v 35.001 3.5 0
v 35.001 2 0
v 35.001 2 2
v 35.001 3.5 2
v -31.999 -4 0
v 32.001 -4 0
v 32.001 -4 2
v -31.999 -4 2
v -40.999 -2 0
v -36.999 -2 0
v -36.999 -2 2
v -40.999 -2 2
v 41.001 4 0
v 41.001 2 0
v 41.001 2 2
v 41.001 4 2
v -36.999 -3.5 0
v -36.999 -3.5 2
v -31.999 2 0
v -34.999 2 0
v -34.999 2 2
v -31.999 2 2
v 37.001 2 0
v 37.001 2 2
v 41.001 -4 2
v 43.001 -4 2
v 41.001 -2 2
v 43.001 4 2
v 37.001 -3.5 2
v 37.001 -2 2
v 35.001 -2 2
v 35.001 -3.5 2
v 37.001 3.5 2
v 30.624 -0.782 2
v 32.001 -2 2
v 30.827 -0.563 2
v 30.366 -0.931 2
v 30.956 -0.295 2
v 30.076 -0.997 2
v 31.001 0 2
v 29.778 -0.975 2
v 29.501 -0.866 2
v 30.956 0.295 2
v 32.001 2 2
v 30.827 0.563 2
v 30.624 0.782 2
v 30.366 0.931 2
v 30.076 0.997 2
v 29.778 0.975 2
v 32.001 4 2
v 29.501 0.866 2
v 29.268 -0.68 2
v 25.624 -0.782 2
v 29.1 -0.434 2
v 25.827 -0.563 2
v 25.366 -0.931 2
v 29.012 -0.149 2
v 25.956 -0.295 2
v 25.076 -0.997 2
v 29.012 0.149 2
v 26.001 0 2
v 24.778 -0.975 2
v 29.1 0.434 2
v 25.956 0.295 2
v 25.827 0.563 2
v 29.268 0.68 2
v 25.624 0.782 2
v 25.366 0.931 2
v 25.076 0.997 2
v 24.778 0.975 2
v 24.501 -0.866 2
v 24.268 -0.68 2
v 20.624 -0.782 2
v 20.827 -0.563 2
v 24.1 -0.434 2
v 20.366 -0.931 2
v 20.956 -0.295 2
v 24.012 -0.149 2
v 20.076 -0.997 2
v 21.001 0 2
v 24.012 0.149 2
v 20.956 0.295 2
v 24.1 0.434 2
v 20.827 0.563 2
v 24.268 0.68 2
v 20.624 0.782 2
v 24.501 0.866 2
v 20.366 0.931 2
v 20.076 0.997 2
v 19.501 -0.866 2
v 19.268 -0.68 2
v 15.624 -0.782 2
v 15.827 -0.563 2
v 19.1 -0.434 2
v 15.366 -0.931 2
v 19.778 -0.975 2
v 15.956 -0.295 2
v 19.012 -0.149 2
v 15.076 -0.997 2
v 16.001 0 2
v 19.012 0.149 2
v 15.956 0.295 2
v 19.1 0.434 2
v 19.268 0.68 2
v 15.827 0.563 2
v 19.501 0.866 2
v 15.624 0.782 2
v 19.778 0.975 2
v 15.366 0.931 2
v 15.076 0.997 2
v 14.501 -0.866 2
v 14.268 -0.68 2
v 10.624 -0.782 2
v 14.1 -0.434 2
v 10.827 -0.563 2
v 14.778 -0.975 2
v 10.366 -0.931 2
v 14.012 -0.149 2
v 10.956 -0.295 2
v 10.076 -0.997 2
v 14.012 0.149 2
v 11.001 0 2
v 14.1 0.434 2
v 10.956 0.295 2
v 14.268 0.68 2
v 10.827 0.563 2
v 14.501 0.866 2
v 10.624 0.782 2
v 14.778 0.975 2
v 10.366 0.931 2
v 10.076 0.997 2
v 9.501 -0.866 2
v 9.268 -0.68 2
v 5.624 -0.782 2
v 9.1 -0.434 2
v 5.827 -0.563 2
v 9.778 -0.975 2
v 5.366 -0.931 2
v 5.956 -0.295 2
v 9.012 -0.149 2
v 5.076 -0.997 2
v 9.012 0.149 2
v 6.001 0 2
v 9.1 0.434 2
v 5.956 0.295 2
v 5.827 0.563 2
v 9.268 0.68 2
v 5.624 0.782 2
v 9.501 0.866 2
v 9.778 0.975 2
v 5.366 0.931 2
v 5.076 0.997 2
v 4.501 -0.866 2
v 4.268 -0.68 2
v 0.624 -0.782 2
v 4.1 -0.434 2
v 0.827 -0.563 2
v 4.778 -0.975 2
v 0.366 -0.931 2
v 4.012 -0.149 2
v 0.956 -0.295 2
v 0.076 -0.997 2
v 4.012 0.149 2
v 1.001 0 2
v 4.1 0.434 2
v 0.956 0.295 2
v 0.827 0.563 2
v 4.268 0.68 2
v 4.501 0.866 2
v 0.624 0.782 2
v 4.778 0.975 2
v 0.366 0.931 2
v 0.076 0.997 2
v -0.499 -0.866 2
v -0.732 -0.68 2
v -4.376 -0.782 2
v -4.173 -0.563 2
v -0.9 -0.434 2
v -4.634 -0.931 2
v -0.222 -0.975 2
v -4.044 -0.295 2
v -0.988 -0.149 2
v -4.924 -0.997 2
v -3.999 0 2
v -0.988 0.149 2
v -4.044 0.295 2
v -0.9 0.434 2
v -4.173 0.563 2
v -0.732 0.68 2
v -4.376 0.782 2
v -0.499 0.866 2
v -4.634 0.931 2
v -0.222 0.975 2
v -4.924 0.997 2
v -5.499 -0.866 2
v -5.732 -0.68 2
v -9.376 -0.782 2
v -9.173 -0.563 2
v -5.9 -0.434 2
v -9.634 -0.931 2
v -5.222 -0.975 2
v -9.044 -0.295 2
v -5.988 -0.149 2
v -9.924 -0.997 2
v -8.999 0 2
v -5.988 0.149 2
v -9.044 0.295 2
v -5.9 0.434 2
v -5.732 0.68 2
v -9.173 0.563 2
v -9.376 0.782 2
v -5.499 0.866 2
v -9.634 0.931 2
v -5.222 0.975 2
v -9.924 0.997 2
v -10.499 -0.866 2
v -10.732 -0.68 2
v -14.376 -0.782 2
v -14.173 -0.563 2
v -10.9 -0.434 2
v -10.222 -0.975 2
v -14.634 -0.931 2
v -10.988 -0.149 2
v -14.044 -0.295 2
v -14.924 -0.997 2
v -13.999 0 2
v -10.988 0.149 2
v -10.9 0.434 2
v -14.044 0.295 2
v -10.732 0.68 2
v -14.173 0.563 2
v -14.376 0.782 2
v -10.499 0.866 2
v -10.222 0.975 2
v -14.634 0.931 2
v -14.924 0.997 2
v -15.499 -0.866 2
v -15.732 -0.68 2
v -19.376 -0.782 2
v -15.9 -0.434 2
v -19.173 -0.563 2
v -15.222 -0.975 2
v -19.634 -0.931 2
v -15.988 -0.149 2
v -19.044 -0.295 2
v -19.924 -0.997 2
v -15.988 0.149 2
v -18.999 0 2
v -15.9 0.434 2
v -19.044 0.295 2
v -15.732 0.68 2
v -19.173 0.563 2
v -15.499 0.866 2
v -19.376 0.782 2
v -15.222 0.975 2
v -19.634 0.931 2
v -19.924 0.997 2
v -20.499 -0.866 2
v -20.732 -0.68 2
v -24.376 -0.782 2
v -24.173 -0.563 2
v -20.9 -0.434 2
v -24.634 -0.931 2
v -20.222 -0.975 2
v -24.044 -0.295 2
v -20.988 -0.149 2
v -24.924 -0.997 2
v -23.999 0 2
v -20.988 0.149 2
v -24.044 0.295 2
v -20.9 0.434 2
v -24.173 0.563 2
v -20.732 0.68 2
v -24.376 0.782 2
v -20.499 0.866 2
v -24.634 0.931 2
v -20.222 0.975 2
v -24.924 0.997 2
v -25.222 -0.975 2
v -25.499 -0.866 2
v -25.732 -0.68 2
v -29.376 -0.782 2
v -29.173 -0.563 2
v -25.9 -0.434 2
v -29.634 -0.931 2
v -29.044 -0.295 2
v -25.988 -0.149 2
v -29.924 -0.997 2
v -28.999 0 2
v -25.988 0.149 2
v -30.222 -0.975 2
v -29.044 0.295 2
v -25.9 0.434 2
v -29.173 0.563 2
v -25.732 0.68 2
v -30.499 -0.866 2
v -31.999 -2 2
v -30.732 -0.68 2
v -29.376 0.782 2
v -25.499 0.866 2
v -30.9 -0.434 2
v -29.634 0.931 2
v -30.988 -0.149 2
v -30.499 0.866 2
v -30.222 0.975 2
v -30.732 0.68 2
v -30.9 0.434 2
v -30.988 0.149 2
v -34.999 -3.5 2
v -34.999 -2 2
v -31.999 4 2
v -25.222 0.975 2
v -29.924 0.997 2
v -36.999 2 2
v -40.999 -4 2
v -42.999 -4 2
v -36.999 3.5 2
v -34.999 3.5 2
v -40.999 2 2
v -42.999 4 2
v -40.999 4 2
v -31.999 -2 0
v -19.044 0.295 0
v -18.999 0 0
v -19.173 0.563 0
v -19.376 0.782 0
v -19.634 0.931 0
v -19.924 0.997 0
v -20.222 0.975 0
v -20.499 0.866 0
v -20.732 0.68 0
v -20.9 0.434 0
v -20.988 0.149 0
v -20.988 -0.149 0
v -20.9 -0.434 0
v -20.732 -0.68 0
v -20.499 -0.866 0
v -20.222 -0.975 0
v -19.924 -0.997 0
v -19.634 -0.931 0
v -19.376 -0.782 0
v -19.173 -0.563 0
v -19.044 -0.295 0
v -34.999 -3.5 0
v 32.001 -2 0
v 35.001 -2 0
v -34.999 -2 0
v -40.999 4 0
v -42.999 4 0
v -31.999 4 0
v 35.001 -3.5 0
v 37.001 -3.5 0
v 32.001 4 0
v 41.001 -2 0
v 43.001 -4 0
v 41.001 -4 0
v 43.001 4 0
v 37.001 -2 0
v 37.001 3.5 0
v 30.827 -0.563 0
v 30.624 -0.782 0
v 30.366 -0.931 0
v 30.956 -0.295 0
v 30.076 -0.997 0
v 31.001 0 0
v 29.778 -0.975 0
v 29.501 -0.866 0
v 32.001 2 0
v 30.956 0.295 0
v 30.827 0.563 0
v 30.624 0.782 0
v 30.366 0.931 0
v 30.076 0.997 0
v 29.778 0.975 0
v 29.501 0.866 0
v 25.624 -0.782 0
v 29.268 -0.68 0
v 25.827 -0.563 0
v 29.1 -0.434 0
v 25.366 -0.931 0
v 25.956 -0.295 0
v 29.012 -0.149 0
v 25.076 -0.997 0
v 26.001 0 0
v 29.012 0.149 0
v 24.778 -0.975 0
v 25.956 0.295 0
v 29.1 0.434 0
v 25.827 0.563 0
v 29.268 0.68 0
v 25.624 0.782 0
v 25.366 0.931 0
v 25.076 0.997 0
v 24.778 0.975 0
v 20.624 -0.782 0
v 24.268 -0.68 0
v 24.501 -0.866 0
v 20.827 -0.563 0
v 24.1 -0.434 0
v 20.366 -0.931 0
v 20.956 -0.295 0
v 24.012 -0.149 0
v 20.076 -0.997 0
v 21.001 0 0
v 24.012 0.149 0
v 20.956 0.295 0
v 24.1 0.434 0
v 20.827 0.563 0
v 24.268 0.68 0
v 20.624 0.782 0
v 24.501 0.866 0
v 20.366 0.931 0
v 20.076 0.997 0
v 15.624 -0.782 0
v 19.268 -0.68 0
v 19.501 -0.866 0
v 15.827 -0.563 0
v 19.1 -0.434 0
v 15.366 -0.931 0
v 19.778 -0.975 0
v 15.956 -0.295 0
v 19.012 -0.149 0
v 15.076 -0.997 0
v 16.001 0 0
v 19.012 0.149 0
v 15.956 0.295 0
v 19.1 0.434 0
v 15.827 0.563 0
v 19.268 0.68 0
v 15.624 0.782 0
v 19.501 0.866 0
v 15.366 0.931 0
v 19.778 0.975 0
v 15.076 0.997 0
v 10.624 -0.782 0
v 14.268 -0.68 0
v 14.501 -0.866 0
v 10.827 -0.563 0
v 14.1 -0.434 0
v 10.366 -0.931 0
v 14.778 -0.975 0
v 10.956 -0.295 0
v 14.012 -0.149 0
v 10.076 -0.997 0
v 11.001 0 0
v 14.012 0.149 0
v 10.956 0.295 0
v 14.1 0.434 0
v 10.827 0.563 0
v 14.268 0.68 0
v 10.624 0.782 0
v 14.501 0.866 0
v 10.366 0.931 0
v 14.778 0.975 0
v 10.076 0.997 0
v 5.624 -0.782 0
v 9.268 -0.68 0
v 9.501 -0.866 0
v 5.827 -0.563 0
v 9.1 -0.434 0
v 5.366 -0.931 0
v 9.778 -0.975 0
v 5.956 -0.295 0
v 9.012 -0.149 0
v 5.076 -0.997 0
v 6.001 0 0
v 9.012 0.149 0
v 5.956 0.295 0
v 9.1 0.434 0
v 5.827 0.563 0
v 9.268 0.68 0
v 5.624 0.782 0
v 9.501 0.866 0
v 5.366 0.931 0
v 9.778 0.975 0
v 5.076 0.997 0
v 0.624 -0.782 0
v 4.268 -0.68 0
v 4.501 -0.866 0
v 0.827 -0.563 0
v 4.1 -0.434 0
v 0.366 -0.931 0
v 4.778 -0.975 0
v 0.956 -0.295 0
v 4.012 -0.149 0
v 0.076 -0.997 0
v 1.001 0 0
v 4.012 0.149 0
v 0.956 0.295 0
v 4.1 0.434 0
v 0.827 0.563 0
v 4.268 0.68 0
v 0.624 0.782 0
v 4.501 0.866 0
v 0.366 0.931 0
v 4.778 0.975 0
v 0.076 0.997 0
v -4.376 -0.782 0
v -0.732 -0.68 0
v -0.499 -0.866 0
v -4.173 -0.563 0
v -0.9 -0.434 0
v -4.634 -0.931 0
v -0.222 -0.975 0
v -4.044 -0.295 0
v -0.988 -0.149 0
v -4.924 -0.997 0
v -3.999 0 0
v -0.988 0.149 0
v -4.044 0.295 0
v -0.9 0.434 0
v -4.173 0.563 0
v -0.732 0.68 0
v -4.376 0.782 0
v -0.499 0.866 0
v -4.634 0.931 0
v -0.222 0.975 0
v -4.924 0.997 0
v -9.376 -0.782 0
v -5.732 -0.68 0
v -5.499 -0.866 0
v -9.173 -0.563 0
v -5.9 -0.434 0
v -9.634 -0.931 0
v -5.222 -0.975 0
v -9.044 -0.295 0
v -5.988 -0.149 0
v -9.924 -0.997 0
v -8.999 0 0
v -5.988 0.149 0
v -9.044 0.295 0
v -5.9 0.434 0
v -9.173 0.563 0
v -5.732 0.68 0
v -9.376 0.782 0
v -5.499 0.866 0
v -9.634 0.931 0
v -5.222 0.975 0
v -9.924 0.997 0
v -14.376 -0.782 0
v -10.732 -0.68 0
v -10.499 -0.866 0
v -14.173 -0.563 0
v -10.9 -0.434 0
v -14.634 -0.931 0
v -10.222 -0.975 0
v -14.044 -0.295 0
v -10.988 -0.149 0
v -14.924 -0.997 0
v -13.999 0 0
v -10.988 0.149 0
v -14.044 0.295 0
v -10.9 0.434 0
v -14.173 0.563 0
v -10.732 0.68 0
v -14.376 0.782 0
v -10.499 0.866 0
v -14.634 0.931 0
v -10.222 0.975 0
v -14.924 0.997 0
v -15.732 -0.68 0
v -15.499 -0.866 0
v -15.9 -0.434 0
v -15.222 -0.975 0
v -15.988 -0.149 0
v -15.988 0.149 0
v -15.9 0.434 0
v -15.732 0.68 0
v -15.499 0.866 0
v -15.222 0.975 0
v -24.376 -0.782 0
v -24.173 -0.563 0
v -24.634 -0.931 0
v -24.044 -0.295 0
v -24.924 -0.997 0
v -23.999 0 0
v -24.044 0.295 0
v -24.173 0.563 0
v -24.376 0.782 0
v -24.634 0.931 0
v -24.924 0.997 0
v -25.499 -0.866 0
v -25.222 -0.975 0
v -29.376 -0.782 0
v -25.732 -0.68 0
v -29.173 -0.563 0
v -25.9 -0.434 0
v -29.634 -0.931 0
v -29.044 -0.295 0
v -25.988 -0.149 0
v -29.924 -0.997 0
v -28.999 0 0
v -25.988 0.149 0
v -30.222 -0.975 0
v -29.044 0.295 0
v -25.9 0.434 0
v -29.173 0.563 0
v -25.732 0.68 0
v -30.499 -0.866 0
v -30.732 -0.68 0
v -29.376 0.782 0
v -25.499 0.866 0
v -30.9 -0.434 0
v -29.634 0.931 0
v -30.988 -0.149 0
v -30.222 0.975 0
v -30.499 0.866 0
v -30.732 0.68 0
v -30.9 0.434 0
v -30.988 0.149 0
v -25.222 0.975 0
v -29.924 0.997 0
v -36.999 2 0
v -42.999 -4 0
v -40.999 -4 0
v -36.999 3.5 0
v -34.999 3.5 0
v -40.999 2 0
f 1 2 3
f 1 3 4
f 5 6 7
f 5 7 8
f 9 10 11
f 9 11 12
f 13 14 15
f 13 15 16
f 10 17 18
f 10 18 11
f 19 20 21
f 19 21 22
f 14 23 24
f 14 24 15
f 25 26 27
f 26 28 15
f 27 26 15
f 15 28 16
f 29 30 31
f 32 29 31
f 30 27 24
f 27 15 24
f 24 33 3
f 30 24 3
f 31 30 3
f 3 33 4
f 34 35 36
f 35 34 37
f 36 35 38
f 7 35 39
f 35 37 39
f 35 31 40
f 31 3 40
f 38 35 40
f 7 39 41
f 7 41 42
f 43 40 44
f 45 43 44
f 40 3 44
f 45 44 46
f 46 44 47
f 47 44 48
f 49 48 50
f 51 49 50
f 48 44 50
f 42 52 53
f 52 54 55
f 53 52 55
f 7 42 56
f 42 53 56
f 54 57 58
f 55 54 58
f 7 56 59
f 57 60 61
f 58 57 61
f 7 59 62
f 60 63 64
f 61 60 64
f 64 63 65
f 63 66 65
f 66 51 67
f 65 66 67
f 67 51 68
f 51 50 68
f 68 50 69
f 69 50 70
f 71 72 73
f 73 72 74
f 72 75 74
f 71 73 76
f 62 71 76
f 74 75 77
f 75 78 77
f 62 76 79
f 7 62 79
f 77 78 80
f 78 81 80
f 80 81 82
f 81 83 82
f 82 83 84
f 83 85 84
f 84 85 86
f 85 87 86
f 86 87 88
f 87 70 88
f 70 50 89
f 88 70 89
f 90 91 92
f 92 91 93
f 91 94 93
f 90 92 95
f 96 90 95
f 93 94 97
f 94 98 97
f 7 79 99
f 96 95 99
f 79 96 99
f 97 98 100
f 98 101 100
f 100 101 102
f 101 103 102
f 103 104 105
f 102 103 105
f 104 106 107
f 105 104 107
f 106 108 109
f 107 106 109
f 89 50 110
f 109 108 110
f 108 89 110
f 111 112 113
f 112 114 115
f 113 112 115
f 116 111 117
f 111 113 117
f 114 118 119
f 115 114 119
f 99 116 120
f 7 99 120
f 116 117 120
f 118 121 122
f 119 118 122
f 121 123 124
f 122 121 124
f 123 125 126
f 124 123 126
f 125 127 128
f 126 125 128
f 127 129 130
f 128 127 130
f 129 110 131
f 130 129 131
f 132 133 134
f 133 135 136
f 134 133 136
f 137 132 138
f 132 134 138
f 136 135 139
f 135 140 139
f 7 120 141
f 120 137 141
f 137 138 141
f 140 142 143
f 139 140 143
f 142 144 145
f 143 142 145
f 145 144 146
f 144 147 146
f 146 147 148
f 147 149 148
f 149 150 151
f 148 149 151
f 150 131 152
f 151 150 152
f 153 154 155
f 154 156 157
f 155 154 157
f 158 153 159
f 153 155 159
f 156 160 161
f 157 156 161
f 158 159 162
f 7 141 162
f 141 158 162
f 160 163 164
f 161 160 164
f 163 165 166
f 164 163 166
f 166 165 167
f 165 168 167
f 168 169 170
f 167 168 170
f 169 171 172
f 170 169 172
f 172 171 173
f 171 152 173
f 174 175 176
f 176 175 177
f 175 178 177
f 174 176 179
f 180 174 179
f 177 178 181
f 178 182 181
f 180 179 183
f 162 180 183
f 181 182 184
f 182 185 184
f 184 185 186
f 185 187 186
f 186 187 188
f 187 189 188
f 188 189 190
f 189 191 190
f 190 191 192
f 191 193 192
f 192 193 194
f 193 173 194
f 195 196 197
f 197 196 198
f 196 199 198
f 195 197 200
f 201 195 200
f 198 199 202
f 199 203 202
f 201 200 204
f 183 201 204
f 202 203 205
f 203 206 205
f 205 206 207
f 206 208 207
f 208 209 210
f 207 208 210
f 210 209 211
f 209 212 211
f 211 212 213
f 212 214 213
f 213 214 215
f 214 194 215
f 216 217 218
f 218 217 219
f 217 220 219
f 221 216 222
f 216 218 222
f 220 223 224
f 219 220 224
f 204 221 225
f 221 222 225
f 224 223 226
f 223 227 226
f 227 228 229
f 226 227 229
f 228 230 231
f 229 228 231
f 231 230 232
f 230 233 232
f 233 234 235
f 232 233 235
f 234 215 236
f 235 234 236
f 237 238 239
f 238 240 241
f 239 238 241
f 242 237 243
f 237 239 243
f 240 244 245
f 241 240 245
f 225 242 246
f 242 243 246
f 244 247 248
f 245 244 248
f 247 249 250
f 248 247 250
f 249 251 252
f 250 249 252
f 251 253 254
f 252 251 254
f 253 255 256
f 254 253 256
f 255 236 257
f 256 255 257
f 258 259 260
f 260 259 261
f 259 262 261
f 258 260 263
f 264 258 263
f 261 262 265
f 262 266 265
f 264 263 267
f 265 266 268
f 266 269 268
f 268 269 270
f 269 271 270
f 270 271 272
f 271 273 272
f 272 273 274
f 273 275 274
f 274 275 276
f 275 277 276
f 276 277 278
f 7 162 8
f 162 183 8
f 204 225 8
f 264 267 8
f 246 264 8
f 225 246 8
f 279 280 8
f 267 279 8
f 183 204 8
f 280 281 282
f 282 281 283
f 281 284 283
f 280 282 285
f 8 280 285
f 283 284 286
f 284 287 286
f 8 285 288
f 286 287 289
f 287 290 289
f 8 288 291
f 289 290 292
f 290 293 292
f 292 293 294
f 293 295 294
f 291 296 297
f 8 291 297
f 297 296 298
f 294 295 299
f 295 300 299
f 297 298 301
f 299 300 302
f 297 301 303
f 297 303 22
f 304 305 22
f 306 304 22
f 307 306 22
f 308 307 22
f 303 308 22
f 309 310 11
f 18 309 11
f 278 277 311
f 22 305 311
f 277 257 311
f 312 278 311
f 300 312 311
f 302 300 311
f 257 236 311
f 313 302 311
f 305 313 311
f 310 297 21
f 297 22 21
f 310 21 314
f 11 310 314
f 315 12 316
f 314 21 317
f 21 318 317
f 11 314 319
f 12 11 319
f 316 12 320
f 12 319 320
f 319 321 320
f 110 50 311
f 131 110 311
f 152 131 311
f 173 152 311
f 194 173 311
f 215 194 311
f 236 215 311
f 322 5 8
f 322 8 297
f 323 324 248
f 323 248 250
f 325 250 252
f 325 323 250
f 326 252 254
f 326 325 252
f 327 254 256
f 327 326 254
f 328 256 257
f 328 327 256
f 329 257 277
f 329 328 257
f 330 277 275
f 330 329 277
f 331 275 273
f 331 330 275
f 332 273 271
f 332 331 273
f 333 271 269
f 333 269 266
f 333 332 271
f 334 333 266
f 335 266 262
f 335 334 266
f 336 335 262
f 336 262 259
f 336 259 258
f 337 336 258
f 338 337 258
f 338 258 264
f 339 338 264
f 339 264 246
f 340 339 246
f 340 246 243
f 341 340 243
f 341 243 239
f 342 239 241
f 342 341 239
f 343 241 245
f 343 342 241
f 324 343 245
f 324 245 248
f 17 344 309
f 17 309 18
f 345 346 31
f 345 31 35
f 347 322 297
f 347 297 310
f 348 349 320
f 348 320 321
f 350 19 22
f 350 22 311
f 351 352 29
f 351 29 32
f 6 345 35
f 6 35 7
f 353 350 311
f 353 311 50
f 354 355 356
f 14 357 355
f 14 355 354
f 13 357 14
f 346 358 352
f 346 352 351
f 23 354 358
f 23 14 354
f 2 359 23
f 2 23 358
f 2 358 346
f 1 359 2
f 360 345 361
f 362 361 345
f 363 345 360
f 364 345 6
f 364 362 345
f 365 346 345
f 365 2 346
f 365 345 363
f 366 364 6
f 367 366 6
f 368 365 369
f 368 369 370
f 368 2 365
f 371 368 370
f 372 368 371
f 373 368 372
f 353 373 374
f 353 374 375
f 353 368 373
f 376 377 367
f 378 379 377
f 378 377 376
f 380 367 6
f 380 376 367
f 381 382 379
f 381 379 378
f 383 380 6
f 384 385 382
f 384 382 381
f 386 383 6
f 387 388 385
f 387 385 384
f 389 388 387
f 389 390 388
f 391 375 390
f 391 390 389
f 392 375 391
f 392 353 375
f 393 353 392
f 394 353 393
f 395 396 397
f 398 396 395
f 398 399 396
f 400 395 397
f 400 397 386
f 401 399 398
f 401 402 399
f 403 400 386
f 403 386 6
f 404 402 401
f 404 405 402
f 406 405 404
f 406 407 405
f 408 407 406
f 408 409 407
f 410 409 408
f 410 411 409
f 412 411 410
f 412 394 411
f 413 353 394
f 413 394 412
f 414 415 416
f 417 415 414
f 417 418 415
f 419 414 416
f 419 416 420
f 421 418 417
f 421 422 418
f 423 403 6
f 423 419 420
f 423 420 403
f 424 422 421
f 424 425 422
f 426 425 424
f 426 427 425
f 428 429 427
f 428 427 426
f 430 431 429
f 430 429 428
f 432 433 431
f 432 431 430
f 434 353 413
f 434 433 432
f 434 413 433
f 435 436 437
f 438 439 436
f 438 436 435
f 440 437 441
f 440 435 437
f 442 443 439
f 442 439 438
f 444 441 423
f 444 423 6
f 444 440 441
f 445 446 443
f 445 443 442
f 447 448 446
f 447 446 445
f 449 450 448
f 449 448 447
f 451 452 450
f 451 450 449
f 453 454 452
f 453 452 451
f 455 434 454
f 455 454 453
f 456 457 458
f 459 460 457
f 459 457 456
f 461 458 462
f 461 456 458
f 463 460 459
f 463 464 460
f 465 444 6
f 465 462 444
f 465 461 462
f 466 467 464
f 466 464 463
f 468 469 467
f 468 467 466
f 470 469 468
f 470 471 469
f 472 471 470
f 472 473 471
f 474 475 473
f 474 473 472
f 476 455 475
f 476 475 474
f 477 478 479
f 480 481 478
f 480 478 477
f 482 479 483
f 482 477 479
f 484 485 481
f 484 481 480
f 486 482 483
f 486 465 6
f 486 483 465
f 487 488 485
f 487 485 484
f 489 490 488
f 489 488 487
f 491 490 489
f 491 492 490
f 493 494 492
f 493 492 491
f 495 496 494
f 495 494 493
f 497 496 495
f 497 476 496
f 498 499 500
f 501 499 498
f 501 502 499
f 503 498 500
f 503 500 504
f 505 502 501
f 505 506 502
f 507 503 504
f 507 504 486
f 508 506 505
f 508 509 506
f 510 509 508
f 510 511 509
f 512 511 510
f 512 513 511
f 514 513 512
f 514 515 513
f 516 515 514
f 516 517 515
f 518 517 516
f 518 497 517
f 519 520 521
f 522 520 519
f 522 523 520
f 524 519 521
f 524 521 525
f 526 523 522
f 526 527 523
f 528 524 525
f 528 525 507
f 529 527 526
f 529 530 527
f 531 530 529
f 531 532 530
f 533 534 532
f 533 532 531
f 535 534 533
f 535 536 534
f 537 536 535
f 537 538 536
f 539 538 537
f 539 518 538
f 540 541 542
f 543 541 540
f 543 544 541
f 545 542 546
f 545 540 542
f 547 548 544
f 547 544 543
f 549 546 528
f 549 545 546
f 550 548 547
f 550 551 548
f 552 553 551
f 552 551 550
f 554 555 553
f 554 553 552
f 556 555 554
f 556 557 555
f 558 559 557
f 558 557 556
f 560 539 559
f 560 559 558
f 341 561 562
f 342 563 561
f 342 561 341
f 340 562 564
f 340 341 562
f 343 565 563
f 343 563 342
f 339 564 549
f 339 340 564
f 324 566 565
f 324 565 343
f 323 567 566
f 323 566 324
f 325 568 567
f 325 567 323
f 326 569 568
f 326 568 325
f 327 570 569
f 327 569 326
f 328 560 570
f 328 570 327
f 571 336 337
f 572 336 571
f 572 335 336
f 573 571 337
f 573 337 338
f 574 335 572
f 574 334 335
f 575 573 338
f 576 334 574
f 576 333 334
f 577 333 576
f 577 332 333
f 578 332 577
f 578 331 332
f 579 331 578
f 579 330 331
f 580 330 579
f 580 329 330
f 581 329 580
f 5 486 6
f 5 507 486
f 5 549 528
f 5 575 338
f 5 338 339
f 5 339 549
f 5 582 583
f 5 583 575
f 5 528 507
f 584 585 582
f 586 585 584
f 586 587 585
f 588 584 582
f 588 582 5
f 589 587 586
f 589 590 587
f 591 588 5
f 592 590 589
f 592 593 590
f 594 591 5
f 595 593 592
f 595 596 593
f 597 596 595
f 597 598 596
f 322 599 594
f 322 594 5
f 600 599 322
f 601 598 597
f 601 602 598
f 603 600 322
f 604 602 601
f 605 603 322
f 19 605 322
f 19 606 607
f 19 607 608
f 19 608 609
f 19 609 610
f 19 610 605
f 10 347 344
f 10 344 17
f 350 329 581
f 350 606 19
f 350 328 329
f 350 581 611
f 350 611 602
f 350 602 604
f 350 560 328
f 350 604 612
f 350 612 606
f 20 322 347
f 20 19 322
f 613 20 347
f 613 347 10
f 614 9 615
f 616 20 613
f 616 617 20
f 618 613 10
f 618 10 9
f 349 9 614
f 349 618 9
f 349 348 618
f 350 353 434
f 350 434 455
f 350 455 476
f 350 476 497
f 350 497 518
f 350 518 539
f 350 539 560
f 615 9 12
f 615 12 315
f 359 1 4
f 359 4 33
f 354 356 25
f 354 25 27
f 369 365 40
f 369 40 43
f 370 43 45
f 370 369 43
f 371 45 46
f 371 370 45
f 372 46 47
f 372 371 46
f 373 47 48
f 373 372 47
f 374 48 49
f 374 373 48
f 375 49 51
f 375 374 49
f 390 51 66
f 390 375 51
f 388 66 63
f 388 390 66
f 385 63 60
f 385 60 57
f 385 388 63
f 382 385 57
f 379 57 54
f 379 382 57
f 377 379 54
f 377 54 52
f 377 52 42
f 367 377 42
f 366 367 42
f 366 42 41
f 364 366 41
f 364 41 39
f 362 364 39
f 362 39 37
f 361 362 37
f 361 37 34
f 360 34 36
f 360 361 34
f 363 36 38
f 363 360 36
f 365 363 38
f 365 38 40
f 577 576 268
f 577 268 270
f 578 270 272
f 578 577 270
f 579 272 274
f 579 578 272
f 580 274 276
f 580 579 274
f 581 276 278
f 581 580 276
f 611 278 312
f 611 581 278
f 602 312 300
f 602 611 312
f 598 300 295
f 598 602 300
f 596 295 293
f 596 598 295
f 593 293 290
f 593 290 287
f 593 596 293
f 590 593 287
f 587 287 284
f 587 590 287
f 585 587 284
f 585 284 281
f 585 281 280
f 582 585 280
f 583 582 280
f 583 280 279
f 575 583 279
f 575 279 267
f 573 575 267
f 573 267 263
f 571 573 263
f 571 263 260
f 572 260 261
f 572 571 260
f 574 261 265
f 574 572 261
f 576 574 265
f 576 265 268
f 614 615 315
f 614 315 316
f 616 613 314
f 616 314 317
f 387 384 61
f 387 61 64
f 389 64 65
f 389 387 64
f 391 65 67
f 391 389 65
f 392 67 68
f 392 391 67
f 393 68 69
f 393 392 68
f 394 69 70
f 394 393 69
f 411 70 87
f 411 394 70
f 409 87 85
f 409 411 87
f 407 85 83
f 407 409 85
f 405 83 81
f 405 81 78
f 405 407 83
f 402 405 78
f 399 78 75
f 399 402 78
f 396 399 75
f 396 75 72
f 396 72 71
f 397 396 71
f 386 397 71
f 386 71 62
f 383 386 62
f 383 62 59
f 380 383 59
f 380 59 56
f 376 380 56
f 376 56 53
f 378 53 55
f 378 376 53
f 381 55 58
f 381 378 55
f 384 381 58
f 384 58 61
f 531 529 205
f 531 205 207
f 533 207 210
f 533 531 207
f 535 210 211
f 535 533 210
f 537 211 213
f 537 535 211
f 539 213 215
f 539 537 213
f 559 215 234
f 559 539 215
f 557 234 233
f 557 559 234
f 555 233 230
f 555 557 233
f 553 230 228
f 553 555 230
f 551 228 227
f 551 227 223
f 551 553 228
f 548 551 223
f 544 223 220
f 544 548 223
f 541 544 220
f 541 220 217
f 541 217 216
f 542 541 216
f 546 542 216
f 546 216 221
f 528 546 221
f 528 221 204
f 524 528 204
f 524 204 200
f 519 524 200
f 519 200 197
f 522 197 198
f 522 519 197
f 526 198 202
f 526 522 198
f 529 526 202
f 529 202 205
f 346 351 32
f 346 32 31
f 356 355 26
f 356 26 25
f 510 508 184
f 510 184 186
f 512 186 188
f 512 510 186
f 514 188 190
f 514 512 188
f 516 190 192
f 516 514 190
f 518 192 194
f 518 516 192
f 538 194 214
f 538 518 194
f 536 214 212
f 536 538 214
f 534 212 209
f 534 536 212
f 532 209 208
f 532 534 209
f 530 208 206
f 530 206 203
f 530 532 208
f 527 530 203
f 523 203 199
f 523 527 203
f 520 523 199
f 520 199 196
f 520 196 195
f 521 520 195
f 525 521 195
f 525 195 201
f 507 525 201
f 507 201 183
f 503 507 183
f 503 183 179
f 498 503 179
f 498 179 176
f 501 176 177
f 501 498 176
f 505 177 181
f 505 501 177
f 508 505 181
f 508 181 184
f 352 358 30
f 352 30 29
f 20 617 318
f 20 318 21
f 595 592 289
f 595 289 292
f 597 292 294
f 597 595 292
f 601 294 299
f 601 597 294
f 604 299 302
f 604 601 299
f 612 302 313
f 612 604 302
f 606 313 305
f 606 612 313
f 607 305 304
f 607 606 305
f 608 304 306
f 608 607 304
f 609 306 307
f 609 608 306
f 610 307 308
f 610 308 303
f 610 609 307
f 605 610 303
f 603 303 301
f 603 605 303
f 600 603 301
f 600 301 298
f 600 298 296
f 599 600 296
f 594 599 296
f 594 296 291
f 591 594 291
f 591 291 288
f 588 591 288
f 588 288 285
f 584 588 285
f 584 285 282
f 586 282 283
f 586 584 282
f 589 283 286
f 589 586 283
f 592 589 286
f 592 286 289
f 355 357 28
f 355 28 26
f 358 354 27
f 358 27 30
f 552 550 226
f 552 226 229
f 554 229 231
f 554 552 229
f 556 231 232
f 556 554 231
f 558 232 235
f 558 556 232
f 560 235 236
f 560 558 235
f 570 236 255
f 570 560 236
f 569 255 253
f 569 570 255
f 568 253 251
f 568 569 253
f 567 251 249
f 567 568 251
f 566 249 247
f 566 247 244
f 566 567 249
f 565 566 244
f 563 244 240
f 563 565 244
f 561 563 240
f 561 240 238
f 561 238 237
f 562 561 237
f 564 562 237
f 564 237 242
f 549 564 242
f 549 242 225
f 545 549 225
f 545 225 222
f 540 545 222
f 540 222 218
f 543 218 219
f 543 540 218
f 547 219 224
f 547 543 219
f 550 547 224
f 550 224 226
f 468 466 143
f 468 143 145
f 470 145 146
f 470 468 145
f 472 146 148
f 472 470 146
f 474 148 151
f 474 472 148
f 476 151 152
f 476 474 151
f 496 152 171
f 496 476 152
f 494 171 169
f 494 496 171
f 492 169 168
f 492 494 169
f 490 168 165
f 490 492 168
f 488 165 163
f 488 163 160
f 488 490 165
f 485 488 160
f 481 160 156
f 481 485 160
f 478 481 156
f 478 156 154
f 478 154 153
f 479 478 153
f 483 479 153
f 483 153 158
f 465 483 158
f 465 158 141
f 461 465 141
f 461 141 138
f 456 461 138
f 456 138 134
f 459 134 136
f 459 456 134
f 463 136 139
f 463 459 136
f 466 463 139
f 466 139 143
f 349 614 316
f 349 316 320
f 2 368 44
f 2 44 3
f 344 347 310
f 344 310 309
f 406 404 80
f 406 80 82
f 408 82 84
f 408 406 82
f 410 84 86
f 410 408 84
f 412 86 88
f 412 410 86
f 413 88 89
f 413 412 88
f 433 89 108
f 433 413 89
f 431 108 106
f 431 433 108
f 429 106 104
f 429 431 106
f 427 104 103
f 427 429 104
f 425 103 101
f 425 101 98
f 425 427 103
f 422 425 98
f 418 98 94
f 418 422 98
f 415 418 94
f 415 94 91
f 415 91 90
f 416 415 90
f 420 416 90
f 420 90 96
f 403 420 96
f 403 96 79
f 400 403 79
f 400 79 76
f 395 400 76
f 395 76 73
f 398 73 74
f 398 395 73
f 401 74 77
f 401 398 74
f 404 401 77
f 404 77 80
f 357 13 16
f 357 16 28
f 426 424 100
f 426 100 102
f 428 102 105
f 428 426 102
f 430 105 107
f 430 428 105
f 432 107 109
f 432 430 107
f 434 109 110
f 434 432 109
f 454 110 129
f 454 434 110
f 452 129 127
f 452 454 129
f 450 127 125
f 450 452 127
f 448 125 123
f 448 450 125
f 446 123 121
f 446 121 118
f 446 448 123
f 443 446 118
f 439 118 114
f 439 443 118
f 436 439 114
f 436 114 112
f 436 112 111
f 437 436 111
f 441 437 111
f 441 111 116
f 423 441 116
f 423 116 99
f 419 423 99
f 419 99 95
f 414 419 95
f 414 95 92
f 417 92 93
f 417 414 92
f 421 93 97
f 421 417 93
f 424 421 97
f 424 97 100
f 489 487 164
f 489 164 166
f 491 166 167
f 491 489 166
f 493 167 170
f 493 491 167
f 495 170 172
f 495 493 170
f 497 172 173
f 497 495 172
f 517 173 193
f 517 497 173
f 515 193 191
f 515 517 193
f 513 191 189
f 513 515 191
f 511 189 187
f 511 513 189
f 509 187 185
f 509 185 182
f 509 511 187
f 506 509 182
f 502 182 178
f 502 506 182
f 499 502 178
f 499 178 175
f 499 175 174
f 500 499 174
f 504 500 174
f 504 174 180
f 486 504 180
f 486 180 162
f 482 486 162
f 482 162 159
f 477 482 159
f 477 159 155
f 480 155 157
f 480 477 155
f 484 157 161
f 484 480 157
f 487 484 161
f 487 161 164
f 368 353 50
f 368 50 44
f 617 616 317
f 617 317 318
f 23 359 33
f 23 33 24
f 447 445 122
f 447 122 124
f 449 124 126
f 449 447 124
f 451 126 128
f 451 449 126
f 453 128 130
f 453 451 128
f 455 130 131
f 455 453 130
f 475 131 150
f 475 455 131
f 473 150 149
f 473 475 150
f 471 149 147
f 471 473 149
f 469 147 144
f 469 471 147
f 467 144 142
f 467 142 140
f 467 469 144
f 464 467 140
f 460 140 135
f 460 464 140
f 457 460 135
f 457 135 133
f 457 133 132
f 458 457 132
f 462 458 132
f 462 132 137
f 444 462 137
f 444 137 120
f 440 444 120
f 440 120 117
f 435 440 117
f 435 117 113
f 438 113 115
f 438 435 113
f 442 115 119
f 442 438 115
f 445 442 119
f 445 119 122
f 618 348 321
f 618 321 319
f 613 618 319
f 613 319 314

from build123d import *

# Parameters (mm, degrees)
SKETCH_1_R      = 1.000000004
EXTRUDE_1_DEPTH = 2


with BuildPart() as part:
    # 草图1 → 凸台-拉伸1 (new body)
    with BuildSketch(Plane.XY):
        Polygon((-31.999107626, 4), (32.000892374, 4), (32.000892374, 2), (35.000892374, 2), (35.000892374, 3.5), (37.000892374, 3.5), (37.000892374, 2), (41.000892374, 2), (41.000892374, 4), (43.000892374, 4), (43.000892374, -4), (41.000892374, -4), (41.000892374, -2), (37.000892374, -2), (37.000892374, -3.5), (35.000892374, -3.5), (35.000892374, -2), (32.000892374, -2), (32.000892374, -4), (-31.999107626, -4), (-31.999107626, -2), (-34.999107626, -2), (-34.999107626, -3.5), (-36.999107626, -3.5), (-36.999107626, -2), (-40.999107626, -2), (-40.999107626, -4), (-42.999107626, -4), (-42.999107626, 4), (-40.999107626, 4), (-40.999107626, 2), (-36.999107626, 2), (-36.999107626, 3.5), (-34.999107626, 3.5), (-34.999107626, 2), (-31.999107626, 2), align=None)
        with Locations((0.000892374, 0)):
            Circle(SKETCH_1_R, mode=Mode.SUBTRACT)
        with Locations((5.000892374, 0)):
            Circle(SKETCH_1_R, mode=Mode.SUBTRACT)
        with Locations((10.000892374, 0)):
            Circle(SKETCH_1_R, mode=Mode.SUBTRACT)
        with Locations((15.000892374, 0)):
            Circle(SKETCH_1_R, mode=Mode.SUBTRACT)
        with Locations((20.000892374, 0)):
            Circle(SKETCH_1_R, mode=Mode.SUBTRACT)
        with Locations((25.000892374, 0)):
            Circle(SKETCH_1_R, mode=Mode.SUBTRACT)
        with Locations((30.000892374, 0)):
            Circle(SKETCH_1_R, mode=Mode.SUBTRACT)
        with Locations((-4.999107626, 0)):
            Circle(SKETCH_1_R, mode=Mode.SUBTRACT)
        with Locations((-9.999107626, 0)):
            Circle(SKETCH_1_R, mode=Mode.SUBTRACT)
        with Locations((-14.999107626, 0)):
            Circle(SKETCH_1_R, mode=Mode.SUBTRACT)
        with Locations((-19.999107626, 0)):
            Circle(SKETCH_1_R, mode=Mode.SUBTRACT)
        with Locations((-24.999107626, 0)):
            Circle(SKETCH_1_R, mode=Mode.SUBTRACT)
        with Locations((-29.999107626, 0)):
            Circle(SKETCH_1_R, mode=Mode.SUBTRACT)
    extrude(amount=EXTRUDE_1_DEPTH)


solid = part.part
